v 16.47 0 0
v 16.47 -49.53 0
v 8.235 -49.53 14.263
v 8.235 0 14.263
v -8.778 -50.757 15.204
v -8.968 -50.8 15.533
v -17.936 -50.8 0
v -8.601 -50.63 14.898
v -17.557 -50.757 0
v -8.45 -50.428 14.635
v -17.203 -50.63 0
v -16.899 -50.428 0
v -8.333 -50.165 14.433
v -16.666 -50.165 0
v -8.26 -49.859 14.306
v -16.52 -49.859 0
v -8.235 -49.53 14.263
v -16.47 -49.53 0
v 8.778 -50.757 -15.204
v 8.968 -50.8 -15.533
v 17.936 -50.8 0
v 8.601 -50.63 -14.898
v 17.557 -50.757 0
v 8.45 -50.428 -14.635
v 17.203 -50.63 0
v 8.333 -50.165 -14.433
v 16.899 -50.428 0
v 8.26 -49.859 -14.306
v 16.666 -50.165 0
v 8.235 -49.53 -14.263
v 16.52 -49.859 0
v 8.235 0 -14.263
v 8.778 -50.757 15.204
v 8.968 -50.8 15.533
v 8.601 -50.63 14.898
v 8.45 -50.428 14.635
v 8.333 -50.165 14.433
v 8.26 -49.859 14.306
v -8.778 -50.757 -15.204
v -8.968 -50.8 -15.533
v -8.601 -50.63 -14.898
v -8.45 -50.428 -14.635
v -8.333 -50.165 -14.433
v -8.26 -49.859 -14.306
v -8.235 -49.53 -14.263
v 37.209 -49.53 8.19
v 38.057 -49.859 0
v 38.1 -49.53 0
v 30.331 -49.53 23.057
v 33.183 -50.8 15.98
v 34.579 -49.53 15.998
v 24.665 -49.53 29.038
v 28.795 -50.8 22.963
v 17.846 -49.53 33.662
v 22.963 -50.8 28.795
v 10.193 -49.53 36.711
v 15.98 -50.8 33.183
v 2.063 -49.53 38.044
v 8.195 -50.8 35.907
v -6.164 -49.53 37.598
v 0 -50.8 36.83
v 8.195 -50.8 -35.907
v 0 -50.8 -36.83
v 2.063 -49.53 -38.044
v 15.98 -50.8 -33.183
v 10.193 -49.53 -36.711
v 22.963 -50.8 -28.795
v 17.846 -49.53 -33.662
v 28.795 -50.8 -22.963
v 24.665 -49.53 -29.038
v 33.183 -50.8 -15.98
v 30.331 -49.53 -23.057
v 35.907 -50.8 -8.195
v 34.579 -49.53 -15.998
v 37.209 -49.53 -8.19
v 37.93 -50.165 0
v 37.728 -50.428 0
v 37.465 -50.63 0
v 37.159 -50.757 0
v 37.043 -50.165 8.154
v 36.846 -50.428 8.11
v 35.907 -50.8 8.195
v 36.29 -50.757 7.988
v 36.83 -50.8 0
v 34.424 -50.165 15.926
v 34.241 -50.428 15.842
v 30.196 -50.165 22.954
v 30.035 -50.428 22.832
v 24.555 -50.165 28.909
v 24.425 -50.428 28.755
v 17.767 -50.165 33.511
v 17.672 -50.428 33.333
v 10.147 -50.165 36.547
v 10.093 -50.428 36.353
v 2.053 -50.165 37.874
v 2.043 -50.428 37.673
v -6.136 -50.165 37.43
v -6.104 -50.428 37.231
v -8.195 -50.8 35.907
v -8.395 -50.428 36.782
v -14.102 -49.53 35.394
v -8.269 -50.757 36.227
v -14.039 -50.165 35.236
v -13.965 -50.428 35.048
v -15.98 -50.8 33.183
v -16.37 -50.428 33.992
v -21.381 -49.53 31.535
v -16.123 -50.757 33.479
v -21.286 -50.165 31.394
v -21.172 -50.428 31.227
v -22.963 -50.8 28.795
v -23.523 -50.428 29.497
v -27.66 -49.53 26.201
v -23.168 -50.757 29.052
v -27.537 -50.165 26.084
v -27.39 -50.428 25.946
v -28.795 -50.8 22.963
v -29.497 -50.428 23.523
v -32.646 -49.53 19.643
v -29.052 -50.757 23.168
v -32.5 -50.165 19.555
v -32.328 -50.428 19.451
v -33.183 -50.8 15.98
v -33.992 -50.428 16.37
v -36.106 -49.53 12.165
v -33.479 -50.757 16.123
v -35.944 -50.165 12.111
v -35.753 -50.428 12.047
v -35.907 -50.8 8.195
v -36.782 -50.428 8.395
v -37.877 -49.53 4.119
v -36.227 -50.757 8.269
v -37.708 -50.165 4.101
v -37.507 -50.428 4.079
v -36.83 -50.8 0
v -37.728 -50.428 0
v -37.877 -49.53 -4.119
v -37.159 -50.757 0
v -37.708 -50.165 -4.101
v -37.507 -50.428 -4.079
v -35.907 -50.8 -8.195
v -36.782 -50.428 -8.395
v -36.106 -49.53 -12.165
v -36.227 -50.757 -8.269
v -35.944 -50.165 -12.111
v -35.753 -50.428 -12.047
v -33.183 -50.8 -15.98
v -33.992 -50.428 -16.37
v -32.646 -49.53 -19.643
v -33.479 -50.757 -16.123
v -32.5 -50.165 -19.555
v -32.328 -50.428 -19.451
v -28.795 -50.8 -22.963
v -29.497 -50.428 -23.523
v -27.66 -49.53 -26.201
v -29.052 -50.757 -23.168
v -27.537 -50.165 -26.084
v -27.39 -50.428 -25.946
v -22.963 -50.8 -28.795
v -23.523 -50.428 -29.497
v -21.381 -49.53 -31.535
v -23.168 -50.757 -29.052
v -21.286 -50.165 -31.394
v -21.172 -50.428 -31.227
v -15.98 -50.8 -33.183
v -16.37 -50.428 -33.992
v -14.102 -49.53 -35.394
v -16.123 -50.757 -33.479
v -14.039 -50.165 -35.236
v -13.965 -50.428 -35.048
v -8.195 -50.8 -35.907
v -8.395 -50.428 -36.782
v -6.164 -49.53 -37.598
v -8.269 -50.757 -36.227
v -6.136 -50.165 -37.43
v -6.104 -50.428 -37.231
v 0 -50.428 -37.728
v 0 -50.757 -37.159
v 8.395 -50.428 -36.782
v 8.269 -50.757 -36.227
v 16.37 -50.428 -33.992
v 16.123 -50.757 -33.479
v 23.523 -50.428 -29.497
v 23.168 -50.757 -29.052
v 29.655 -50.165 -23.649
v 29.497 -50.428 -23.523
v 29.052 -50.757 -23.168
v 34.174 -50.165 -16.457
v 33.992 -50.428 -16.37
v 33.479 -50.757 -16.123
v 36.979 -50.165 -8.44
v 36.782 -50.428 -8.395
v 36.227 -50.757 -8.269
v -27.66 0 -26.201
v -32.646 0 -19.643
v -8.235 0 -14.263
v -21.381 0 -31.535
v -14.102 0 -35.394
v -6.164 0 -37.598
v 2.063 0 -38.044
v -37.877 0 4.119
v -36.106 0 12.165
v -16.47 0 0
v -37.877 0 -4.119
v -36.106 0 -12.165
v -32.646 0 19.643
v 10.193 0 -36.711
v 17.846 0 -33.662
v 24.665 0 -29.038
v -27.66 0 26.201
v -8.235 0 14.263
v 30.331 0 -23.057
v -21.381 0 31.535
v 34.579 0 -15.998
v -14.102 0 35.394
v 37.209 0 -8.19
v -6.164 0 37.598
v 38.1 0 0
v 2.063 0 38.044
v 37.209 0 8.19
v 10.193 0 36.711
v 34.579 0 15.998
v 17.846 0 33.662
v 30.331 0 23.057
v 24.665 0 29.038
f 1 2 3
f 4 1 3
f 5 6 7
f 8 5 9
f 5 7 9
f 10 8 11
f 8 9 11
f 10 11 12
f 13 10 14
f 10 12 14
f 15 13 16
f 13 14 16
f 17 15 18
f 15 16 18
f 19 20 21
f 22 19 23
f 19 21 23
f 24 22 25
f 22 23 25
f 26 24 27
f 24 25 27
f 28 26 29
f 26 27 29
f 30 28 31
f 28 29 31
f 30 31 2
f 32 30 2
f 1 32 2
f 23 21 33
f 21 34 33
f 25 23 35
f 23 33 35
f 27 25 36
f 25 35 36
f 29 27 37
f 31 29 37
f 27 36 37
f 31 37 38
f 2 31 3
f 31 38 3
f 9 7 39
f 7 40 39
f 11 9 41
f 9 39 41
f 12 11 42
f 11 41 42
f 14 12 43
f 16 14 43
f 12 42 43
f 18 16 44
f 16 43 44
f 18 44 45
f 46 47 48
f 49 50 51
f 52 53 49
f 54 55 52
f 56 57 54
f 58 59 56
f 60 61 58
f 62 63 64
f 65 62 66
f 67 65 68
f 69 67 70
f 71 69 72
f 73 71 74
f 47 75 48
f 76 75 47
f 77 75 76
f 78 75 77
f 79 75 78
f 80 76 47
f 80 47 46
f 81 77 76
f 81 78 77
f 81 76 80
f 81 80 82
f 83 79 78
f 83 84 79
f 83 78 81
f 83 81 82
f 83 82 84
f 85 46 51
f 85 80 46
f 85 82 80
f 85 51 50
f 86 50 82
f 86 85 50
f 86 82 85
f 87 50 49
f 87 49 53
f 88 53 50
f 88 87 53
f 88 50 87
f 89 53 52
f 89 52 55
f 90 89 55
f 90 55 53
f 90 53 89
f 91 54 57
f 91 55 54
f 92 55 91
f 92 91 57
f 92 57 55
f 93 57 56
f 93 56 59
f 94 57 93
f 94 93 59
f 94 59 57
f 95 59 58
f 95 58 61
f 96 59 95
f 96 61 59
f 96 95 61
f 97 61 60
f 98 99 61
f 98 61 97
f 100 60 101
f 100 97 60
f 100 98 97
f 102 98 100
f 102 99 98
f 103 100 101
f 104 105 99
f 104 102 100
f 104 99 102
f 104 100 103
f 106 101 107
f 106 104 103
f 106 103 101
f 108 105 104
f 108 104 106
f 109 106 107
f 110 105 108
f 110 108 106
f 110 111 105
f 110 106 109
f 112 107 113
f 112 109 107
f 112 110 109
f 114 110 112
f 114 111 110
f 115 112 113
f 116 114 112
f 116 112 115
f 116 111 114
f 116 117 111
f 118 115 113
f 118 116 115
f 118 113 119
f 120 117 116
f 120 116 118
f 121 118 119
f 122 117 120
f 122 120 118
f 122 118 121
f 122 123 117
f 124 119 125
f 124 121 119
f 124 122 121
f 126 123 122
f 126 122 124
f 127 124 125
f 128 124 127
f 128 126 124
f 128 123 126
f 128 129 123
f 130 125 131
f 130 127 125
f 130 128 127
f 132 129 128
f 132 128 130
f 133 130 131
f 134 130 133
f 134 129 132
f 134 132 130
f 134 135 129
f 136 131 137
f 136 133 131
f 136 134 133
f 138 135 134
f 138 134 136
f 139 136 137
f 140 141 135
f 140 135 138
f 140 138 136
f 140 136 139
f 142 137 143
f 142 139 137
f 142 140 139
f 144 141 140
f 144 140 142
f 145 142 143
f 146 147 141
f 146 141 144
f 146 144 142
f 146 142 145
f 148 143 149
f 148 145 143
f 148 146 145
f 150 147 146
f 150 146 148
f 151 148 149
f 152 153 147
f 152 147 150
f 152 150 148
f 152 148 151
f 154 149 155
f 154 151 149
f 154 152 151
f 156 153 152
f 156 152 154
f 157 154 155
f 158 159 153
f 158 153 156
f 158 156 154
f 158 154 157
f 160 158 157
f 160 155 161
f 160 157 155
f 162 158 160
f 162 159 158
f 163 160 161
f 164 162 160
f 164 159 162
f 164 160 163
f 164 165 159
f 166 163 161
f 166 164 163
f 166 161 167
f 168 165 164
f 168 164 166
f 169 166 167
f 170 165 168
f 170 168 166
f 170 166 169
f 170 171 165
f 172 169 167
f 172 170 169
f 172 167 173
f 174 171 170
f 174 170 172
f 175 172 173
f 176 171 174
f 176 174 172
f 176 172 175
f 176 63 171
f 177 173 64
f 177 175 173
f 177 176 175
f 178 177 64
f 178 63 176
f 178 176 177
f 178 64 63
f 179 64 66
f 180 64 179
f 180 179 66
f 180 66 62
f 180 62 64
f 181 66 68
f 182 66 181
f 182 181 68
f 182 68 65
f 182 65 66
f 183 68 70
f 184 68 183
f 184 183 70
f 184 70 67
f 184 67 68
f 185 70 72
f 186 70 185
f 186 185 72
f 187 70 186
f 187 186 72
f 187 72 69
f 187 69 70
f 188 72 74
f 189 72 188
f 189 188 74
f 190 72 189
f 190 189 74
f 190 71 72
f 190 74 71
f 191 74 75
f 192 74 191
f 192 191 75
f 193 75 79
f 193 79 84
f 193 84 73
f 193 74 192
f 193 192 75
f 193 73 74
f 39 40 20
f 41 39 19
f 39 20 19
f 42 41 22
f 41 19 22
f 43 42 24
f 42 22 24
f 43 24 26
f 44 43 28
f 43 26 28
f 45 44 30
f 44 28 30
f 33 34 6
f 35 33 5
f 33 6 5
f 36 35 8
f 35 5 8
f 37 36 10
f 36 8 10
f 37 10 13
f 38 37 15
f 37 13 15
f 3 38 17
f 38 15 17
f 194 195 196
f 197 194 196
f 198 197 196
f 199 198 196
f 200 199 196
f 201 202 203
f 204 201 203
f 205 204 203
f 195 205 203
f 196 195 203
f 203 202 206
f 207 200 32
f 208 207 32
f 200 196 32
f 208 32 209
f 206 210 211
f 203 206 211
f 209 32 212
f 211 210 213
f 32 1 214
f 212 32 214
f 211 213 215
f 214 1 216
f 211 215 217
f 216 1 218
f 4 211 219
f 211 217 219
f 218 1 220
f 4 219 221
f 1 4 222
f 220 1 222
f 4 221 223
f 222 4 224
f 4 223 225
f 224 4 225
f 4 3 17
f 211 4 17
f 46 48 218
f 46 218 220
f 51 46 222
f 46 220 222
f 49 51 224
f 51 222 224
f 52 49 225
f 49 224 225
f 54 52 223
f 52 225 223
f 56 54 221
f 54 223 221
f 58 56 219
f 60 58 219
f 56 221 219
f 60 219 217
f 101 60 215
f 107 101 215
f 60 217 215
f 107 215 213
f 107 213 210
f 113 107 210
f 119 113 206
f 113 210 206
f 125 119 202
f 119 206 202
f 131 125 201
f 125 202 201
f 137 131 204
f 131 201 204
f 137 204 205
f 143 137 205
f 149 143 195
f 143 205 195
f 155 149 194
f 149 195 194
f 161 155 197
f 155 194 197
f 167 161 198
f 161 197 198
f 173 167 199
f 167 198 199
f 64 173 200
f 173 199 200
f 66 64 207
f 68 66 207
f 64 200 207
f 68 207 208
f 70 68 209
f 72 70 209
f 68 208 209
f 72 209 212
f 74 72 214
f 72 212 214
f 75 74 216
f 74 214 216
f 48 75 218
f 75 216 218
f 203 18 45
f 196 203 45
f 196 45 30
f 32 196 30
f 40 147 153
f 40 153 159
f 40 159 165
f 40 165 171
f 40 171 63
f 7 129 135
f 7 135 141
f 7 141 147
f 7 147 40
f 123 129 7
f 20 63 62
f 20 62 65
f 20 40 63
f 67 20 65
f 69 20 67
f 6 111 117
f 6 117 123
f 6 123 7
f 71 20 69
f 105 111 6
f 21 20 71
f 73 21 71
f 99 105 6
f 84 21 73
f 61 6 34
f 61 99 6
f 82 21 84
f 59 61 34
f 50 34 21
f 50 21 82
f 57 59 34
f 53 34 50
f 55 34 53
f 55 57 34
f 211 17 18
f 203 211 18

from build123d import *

# Parameters (mm, degrees)
F0_R     = 38.1
F1_DEPTH = 50.8
F3_DEPTH = 50.801
F4_R     = 1.27


with BuildPart() as f1:
    # F0 (on Front) → F1 (new body)
    with BuildSketch(Plane.XZ):
        Circle(F0_R)
    extrude(amount=F1_DEPTH)

    # F2 (on face) → F3 (cut, through all)
    with BuildSketch(Plane.XZ.offset(50.8)):
        Polygon((-8.2347917144, -14.263077639), (8.2347917144, -14.263077639), (16.4695834287, 0), (8.2347917144, 14.263077639), (-8.2347917144, 14.263077639), (-16.4695834287, 0), align=None)
    extrude(amount=-F3_DEPTH, mode=Mode.SUBTRACT)

    # F4
    f4_edges = [f1.edges().sort_by_distance(p)[0] for p in [
        (-38.1, -50.8, 0),
        (0, -50.8, -14.263078),
        (12.352188, -50.8, -7.131539),
        (12.352188, -50.8, 7.131539),
        (0, -50.8, 14.263078),
        (-12.352188, -50.8, 7.131539),
        (-12.352188, -50.8, -7.131539),
    ]]
    fillet(f4_edges, radius=F4_R)


solid = f1.part
